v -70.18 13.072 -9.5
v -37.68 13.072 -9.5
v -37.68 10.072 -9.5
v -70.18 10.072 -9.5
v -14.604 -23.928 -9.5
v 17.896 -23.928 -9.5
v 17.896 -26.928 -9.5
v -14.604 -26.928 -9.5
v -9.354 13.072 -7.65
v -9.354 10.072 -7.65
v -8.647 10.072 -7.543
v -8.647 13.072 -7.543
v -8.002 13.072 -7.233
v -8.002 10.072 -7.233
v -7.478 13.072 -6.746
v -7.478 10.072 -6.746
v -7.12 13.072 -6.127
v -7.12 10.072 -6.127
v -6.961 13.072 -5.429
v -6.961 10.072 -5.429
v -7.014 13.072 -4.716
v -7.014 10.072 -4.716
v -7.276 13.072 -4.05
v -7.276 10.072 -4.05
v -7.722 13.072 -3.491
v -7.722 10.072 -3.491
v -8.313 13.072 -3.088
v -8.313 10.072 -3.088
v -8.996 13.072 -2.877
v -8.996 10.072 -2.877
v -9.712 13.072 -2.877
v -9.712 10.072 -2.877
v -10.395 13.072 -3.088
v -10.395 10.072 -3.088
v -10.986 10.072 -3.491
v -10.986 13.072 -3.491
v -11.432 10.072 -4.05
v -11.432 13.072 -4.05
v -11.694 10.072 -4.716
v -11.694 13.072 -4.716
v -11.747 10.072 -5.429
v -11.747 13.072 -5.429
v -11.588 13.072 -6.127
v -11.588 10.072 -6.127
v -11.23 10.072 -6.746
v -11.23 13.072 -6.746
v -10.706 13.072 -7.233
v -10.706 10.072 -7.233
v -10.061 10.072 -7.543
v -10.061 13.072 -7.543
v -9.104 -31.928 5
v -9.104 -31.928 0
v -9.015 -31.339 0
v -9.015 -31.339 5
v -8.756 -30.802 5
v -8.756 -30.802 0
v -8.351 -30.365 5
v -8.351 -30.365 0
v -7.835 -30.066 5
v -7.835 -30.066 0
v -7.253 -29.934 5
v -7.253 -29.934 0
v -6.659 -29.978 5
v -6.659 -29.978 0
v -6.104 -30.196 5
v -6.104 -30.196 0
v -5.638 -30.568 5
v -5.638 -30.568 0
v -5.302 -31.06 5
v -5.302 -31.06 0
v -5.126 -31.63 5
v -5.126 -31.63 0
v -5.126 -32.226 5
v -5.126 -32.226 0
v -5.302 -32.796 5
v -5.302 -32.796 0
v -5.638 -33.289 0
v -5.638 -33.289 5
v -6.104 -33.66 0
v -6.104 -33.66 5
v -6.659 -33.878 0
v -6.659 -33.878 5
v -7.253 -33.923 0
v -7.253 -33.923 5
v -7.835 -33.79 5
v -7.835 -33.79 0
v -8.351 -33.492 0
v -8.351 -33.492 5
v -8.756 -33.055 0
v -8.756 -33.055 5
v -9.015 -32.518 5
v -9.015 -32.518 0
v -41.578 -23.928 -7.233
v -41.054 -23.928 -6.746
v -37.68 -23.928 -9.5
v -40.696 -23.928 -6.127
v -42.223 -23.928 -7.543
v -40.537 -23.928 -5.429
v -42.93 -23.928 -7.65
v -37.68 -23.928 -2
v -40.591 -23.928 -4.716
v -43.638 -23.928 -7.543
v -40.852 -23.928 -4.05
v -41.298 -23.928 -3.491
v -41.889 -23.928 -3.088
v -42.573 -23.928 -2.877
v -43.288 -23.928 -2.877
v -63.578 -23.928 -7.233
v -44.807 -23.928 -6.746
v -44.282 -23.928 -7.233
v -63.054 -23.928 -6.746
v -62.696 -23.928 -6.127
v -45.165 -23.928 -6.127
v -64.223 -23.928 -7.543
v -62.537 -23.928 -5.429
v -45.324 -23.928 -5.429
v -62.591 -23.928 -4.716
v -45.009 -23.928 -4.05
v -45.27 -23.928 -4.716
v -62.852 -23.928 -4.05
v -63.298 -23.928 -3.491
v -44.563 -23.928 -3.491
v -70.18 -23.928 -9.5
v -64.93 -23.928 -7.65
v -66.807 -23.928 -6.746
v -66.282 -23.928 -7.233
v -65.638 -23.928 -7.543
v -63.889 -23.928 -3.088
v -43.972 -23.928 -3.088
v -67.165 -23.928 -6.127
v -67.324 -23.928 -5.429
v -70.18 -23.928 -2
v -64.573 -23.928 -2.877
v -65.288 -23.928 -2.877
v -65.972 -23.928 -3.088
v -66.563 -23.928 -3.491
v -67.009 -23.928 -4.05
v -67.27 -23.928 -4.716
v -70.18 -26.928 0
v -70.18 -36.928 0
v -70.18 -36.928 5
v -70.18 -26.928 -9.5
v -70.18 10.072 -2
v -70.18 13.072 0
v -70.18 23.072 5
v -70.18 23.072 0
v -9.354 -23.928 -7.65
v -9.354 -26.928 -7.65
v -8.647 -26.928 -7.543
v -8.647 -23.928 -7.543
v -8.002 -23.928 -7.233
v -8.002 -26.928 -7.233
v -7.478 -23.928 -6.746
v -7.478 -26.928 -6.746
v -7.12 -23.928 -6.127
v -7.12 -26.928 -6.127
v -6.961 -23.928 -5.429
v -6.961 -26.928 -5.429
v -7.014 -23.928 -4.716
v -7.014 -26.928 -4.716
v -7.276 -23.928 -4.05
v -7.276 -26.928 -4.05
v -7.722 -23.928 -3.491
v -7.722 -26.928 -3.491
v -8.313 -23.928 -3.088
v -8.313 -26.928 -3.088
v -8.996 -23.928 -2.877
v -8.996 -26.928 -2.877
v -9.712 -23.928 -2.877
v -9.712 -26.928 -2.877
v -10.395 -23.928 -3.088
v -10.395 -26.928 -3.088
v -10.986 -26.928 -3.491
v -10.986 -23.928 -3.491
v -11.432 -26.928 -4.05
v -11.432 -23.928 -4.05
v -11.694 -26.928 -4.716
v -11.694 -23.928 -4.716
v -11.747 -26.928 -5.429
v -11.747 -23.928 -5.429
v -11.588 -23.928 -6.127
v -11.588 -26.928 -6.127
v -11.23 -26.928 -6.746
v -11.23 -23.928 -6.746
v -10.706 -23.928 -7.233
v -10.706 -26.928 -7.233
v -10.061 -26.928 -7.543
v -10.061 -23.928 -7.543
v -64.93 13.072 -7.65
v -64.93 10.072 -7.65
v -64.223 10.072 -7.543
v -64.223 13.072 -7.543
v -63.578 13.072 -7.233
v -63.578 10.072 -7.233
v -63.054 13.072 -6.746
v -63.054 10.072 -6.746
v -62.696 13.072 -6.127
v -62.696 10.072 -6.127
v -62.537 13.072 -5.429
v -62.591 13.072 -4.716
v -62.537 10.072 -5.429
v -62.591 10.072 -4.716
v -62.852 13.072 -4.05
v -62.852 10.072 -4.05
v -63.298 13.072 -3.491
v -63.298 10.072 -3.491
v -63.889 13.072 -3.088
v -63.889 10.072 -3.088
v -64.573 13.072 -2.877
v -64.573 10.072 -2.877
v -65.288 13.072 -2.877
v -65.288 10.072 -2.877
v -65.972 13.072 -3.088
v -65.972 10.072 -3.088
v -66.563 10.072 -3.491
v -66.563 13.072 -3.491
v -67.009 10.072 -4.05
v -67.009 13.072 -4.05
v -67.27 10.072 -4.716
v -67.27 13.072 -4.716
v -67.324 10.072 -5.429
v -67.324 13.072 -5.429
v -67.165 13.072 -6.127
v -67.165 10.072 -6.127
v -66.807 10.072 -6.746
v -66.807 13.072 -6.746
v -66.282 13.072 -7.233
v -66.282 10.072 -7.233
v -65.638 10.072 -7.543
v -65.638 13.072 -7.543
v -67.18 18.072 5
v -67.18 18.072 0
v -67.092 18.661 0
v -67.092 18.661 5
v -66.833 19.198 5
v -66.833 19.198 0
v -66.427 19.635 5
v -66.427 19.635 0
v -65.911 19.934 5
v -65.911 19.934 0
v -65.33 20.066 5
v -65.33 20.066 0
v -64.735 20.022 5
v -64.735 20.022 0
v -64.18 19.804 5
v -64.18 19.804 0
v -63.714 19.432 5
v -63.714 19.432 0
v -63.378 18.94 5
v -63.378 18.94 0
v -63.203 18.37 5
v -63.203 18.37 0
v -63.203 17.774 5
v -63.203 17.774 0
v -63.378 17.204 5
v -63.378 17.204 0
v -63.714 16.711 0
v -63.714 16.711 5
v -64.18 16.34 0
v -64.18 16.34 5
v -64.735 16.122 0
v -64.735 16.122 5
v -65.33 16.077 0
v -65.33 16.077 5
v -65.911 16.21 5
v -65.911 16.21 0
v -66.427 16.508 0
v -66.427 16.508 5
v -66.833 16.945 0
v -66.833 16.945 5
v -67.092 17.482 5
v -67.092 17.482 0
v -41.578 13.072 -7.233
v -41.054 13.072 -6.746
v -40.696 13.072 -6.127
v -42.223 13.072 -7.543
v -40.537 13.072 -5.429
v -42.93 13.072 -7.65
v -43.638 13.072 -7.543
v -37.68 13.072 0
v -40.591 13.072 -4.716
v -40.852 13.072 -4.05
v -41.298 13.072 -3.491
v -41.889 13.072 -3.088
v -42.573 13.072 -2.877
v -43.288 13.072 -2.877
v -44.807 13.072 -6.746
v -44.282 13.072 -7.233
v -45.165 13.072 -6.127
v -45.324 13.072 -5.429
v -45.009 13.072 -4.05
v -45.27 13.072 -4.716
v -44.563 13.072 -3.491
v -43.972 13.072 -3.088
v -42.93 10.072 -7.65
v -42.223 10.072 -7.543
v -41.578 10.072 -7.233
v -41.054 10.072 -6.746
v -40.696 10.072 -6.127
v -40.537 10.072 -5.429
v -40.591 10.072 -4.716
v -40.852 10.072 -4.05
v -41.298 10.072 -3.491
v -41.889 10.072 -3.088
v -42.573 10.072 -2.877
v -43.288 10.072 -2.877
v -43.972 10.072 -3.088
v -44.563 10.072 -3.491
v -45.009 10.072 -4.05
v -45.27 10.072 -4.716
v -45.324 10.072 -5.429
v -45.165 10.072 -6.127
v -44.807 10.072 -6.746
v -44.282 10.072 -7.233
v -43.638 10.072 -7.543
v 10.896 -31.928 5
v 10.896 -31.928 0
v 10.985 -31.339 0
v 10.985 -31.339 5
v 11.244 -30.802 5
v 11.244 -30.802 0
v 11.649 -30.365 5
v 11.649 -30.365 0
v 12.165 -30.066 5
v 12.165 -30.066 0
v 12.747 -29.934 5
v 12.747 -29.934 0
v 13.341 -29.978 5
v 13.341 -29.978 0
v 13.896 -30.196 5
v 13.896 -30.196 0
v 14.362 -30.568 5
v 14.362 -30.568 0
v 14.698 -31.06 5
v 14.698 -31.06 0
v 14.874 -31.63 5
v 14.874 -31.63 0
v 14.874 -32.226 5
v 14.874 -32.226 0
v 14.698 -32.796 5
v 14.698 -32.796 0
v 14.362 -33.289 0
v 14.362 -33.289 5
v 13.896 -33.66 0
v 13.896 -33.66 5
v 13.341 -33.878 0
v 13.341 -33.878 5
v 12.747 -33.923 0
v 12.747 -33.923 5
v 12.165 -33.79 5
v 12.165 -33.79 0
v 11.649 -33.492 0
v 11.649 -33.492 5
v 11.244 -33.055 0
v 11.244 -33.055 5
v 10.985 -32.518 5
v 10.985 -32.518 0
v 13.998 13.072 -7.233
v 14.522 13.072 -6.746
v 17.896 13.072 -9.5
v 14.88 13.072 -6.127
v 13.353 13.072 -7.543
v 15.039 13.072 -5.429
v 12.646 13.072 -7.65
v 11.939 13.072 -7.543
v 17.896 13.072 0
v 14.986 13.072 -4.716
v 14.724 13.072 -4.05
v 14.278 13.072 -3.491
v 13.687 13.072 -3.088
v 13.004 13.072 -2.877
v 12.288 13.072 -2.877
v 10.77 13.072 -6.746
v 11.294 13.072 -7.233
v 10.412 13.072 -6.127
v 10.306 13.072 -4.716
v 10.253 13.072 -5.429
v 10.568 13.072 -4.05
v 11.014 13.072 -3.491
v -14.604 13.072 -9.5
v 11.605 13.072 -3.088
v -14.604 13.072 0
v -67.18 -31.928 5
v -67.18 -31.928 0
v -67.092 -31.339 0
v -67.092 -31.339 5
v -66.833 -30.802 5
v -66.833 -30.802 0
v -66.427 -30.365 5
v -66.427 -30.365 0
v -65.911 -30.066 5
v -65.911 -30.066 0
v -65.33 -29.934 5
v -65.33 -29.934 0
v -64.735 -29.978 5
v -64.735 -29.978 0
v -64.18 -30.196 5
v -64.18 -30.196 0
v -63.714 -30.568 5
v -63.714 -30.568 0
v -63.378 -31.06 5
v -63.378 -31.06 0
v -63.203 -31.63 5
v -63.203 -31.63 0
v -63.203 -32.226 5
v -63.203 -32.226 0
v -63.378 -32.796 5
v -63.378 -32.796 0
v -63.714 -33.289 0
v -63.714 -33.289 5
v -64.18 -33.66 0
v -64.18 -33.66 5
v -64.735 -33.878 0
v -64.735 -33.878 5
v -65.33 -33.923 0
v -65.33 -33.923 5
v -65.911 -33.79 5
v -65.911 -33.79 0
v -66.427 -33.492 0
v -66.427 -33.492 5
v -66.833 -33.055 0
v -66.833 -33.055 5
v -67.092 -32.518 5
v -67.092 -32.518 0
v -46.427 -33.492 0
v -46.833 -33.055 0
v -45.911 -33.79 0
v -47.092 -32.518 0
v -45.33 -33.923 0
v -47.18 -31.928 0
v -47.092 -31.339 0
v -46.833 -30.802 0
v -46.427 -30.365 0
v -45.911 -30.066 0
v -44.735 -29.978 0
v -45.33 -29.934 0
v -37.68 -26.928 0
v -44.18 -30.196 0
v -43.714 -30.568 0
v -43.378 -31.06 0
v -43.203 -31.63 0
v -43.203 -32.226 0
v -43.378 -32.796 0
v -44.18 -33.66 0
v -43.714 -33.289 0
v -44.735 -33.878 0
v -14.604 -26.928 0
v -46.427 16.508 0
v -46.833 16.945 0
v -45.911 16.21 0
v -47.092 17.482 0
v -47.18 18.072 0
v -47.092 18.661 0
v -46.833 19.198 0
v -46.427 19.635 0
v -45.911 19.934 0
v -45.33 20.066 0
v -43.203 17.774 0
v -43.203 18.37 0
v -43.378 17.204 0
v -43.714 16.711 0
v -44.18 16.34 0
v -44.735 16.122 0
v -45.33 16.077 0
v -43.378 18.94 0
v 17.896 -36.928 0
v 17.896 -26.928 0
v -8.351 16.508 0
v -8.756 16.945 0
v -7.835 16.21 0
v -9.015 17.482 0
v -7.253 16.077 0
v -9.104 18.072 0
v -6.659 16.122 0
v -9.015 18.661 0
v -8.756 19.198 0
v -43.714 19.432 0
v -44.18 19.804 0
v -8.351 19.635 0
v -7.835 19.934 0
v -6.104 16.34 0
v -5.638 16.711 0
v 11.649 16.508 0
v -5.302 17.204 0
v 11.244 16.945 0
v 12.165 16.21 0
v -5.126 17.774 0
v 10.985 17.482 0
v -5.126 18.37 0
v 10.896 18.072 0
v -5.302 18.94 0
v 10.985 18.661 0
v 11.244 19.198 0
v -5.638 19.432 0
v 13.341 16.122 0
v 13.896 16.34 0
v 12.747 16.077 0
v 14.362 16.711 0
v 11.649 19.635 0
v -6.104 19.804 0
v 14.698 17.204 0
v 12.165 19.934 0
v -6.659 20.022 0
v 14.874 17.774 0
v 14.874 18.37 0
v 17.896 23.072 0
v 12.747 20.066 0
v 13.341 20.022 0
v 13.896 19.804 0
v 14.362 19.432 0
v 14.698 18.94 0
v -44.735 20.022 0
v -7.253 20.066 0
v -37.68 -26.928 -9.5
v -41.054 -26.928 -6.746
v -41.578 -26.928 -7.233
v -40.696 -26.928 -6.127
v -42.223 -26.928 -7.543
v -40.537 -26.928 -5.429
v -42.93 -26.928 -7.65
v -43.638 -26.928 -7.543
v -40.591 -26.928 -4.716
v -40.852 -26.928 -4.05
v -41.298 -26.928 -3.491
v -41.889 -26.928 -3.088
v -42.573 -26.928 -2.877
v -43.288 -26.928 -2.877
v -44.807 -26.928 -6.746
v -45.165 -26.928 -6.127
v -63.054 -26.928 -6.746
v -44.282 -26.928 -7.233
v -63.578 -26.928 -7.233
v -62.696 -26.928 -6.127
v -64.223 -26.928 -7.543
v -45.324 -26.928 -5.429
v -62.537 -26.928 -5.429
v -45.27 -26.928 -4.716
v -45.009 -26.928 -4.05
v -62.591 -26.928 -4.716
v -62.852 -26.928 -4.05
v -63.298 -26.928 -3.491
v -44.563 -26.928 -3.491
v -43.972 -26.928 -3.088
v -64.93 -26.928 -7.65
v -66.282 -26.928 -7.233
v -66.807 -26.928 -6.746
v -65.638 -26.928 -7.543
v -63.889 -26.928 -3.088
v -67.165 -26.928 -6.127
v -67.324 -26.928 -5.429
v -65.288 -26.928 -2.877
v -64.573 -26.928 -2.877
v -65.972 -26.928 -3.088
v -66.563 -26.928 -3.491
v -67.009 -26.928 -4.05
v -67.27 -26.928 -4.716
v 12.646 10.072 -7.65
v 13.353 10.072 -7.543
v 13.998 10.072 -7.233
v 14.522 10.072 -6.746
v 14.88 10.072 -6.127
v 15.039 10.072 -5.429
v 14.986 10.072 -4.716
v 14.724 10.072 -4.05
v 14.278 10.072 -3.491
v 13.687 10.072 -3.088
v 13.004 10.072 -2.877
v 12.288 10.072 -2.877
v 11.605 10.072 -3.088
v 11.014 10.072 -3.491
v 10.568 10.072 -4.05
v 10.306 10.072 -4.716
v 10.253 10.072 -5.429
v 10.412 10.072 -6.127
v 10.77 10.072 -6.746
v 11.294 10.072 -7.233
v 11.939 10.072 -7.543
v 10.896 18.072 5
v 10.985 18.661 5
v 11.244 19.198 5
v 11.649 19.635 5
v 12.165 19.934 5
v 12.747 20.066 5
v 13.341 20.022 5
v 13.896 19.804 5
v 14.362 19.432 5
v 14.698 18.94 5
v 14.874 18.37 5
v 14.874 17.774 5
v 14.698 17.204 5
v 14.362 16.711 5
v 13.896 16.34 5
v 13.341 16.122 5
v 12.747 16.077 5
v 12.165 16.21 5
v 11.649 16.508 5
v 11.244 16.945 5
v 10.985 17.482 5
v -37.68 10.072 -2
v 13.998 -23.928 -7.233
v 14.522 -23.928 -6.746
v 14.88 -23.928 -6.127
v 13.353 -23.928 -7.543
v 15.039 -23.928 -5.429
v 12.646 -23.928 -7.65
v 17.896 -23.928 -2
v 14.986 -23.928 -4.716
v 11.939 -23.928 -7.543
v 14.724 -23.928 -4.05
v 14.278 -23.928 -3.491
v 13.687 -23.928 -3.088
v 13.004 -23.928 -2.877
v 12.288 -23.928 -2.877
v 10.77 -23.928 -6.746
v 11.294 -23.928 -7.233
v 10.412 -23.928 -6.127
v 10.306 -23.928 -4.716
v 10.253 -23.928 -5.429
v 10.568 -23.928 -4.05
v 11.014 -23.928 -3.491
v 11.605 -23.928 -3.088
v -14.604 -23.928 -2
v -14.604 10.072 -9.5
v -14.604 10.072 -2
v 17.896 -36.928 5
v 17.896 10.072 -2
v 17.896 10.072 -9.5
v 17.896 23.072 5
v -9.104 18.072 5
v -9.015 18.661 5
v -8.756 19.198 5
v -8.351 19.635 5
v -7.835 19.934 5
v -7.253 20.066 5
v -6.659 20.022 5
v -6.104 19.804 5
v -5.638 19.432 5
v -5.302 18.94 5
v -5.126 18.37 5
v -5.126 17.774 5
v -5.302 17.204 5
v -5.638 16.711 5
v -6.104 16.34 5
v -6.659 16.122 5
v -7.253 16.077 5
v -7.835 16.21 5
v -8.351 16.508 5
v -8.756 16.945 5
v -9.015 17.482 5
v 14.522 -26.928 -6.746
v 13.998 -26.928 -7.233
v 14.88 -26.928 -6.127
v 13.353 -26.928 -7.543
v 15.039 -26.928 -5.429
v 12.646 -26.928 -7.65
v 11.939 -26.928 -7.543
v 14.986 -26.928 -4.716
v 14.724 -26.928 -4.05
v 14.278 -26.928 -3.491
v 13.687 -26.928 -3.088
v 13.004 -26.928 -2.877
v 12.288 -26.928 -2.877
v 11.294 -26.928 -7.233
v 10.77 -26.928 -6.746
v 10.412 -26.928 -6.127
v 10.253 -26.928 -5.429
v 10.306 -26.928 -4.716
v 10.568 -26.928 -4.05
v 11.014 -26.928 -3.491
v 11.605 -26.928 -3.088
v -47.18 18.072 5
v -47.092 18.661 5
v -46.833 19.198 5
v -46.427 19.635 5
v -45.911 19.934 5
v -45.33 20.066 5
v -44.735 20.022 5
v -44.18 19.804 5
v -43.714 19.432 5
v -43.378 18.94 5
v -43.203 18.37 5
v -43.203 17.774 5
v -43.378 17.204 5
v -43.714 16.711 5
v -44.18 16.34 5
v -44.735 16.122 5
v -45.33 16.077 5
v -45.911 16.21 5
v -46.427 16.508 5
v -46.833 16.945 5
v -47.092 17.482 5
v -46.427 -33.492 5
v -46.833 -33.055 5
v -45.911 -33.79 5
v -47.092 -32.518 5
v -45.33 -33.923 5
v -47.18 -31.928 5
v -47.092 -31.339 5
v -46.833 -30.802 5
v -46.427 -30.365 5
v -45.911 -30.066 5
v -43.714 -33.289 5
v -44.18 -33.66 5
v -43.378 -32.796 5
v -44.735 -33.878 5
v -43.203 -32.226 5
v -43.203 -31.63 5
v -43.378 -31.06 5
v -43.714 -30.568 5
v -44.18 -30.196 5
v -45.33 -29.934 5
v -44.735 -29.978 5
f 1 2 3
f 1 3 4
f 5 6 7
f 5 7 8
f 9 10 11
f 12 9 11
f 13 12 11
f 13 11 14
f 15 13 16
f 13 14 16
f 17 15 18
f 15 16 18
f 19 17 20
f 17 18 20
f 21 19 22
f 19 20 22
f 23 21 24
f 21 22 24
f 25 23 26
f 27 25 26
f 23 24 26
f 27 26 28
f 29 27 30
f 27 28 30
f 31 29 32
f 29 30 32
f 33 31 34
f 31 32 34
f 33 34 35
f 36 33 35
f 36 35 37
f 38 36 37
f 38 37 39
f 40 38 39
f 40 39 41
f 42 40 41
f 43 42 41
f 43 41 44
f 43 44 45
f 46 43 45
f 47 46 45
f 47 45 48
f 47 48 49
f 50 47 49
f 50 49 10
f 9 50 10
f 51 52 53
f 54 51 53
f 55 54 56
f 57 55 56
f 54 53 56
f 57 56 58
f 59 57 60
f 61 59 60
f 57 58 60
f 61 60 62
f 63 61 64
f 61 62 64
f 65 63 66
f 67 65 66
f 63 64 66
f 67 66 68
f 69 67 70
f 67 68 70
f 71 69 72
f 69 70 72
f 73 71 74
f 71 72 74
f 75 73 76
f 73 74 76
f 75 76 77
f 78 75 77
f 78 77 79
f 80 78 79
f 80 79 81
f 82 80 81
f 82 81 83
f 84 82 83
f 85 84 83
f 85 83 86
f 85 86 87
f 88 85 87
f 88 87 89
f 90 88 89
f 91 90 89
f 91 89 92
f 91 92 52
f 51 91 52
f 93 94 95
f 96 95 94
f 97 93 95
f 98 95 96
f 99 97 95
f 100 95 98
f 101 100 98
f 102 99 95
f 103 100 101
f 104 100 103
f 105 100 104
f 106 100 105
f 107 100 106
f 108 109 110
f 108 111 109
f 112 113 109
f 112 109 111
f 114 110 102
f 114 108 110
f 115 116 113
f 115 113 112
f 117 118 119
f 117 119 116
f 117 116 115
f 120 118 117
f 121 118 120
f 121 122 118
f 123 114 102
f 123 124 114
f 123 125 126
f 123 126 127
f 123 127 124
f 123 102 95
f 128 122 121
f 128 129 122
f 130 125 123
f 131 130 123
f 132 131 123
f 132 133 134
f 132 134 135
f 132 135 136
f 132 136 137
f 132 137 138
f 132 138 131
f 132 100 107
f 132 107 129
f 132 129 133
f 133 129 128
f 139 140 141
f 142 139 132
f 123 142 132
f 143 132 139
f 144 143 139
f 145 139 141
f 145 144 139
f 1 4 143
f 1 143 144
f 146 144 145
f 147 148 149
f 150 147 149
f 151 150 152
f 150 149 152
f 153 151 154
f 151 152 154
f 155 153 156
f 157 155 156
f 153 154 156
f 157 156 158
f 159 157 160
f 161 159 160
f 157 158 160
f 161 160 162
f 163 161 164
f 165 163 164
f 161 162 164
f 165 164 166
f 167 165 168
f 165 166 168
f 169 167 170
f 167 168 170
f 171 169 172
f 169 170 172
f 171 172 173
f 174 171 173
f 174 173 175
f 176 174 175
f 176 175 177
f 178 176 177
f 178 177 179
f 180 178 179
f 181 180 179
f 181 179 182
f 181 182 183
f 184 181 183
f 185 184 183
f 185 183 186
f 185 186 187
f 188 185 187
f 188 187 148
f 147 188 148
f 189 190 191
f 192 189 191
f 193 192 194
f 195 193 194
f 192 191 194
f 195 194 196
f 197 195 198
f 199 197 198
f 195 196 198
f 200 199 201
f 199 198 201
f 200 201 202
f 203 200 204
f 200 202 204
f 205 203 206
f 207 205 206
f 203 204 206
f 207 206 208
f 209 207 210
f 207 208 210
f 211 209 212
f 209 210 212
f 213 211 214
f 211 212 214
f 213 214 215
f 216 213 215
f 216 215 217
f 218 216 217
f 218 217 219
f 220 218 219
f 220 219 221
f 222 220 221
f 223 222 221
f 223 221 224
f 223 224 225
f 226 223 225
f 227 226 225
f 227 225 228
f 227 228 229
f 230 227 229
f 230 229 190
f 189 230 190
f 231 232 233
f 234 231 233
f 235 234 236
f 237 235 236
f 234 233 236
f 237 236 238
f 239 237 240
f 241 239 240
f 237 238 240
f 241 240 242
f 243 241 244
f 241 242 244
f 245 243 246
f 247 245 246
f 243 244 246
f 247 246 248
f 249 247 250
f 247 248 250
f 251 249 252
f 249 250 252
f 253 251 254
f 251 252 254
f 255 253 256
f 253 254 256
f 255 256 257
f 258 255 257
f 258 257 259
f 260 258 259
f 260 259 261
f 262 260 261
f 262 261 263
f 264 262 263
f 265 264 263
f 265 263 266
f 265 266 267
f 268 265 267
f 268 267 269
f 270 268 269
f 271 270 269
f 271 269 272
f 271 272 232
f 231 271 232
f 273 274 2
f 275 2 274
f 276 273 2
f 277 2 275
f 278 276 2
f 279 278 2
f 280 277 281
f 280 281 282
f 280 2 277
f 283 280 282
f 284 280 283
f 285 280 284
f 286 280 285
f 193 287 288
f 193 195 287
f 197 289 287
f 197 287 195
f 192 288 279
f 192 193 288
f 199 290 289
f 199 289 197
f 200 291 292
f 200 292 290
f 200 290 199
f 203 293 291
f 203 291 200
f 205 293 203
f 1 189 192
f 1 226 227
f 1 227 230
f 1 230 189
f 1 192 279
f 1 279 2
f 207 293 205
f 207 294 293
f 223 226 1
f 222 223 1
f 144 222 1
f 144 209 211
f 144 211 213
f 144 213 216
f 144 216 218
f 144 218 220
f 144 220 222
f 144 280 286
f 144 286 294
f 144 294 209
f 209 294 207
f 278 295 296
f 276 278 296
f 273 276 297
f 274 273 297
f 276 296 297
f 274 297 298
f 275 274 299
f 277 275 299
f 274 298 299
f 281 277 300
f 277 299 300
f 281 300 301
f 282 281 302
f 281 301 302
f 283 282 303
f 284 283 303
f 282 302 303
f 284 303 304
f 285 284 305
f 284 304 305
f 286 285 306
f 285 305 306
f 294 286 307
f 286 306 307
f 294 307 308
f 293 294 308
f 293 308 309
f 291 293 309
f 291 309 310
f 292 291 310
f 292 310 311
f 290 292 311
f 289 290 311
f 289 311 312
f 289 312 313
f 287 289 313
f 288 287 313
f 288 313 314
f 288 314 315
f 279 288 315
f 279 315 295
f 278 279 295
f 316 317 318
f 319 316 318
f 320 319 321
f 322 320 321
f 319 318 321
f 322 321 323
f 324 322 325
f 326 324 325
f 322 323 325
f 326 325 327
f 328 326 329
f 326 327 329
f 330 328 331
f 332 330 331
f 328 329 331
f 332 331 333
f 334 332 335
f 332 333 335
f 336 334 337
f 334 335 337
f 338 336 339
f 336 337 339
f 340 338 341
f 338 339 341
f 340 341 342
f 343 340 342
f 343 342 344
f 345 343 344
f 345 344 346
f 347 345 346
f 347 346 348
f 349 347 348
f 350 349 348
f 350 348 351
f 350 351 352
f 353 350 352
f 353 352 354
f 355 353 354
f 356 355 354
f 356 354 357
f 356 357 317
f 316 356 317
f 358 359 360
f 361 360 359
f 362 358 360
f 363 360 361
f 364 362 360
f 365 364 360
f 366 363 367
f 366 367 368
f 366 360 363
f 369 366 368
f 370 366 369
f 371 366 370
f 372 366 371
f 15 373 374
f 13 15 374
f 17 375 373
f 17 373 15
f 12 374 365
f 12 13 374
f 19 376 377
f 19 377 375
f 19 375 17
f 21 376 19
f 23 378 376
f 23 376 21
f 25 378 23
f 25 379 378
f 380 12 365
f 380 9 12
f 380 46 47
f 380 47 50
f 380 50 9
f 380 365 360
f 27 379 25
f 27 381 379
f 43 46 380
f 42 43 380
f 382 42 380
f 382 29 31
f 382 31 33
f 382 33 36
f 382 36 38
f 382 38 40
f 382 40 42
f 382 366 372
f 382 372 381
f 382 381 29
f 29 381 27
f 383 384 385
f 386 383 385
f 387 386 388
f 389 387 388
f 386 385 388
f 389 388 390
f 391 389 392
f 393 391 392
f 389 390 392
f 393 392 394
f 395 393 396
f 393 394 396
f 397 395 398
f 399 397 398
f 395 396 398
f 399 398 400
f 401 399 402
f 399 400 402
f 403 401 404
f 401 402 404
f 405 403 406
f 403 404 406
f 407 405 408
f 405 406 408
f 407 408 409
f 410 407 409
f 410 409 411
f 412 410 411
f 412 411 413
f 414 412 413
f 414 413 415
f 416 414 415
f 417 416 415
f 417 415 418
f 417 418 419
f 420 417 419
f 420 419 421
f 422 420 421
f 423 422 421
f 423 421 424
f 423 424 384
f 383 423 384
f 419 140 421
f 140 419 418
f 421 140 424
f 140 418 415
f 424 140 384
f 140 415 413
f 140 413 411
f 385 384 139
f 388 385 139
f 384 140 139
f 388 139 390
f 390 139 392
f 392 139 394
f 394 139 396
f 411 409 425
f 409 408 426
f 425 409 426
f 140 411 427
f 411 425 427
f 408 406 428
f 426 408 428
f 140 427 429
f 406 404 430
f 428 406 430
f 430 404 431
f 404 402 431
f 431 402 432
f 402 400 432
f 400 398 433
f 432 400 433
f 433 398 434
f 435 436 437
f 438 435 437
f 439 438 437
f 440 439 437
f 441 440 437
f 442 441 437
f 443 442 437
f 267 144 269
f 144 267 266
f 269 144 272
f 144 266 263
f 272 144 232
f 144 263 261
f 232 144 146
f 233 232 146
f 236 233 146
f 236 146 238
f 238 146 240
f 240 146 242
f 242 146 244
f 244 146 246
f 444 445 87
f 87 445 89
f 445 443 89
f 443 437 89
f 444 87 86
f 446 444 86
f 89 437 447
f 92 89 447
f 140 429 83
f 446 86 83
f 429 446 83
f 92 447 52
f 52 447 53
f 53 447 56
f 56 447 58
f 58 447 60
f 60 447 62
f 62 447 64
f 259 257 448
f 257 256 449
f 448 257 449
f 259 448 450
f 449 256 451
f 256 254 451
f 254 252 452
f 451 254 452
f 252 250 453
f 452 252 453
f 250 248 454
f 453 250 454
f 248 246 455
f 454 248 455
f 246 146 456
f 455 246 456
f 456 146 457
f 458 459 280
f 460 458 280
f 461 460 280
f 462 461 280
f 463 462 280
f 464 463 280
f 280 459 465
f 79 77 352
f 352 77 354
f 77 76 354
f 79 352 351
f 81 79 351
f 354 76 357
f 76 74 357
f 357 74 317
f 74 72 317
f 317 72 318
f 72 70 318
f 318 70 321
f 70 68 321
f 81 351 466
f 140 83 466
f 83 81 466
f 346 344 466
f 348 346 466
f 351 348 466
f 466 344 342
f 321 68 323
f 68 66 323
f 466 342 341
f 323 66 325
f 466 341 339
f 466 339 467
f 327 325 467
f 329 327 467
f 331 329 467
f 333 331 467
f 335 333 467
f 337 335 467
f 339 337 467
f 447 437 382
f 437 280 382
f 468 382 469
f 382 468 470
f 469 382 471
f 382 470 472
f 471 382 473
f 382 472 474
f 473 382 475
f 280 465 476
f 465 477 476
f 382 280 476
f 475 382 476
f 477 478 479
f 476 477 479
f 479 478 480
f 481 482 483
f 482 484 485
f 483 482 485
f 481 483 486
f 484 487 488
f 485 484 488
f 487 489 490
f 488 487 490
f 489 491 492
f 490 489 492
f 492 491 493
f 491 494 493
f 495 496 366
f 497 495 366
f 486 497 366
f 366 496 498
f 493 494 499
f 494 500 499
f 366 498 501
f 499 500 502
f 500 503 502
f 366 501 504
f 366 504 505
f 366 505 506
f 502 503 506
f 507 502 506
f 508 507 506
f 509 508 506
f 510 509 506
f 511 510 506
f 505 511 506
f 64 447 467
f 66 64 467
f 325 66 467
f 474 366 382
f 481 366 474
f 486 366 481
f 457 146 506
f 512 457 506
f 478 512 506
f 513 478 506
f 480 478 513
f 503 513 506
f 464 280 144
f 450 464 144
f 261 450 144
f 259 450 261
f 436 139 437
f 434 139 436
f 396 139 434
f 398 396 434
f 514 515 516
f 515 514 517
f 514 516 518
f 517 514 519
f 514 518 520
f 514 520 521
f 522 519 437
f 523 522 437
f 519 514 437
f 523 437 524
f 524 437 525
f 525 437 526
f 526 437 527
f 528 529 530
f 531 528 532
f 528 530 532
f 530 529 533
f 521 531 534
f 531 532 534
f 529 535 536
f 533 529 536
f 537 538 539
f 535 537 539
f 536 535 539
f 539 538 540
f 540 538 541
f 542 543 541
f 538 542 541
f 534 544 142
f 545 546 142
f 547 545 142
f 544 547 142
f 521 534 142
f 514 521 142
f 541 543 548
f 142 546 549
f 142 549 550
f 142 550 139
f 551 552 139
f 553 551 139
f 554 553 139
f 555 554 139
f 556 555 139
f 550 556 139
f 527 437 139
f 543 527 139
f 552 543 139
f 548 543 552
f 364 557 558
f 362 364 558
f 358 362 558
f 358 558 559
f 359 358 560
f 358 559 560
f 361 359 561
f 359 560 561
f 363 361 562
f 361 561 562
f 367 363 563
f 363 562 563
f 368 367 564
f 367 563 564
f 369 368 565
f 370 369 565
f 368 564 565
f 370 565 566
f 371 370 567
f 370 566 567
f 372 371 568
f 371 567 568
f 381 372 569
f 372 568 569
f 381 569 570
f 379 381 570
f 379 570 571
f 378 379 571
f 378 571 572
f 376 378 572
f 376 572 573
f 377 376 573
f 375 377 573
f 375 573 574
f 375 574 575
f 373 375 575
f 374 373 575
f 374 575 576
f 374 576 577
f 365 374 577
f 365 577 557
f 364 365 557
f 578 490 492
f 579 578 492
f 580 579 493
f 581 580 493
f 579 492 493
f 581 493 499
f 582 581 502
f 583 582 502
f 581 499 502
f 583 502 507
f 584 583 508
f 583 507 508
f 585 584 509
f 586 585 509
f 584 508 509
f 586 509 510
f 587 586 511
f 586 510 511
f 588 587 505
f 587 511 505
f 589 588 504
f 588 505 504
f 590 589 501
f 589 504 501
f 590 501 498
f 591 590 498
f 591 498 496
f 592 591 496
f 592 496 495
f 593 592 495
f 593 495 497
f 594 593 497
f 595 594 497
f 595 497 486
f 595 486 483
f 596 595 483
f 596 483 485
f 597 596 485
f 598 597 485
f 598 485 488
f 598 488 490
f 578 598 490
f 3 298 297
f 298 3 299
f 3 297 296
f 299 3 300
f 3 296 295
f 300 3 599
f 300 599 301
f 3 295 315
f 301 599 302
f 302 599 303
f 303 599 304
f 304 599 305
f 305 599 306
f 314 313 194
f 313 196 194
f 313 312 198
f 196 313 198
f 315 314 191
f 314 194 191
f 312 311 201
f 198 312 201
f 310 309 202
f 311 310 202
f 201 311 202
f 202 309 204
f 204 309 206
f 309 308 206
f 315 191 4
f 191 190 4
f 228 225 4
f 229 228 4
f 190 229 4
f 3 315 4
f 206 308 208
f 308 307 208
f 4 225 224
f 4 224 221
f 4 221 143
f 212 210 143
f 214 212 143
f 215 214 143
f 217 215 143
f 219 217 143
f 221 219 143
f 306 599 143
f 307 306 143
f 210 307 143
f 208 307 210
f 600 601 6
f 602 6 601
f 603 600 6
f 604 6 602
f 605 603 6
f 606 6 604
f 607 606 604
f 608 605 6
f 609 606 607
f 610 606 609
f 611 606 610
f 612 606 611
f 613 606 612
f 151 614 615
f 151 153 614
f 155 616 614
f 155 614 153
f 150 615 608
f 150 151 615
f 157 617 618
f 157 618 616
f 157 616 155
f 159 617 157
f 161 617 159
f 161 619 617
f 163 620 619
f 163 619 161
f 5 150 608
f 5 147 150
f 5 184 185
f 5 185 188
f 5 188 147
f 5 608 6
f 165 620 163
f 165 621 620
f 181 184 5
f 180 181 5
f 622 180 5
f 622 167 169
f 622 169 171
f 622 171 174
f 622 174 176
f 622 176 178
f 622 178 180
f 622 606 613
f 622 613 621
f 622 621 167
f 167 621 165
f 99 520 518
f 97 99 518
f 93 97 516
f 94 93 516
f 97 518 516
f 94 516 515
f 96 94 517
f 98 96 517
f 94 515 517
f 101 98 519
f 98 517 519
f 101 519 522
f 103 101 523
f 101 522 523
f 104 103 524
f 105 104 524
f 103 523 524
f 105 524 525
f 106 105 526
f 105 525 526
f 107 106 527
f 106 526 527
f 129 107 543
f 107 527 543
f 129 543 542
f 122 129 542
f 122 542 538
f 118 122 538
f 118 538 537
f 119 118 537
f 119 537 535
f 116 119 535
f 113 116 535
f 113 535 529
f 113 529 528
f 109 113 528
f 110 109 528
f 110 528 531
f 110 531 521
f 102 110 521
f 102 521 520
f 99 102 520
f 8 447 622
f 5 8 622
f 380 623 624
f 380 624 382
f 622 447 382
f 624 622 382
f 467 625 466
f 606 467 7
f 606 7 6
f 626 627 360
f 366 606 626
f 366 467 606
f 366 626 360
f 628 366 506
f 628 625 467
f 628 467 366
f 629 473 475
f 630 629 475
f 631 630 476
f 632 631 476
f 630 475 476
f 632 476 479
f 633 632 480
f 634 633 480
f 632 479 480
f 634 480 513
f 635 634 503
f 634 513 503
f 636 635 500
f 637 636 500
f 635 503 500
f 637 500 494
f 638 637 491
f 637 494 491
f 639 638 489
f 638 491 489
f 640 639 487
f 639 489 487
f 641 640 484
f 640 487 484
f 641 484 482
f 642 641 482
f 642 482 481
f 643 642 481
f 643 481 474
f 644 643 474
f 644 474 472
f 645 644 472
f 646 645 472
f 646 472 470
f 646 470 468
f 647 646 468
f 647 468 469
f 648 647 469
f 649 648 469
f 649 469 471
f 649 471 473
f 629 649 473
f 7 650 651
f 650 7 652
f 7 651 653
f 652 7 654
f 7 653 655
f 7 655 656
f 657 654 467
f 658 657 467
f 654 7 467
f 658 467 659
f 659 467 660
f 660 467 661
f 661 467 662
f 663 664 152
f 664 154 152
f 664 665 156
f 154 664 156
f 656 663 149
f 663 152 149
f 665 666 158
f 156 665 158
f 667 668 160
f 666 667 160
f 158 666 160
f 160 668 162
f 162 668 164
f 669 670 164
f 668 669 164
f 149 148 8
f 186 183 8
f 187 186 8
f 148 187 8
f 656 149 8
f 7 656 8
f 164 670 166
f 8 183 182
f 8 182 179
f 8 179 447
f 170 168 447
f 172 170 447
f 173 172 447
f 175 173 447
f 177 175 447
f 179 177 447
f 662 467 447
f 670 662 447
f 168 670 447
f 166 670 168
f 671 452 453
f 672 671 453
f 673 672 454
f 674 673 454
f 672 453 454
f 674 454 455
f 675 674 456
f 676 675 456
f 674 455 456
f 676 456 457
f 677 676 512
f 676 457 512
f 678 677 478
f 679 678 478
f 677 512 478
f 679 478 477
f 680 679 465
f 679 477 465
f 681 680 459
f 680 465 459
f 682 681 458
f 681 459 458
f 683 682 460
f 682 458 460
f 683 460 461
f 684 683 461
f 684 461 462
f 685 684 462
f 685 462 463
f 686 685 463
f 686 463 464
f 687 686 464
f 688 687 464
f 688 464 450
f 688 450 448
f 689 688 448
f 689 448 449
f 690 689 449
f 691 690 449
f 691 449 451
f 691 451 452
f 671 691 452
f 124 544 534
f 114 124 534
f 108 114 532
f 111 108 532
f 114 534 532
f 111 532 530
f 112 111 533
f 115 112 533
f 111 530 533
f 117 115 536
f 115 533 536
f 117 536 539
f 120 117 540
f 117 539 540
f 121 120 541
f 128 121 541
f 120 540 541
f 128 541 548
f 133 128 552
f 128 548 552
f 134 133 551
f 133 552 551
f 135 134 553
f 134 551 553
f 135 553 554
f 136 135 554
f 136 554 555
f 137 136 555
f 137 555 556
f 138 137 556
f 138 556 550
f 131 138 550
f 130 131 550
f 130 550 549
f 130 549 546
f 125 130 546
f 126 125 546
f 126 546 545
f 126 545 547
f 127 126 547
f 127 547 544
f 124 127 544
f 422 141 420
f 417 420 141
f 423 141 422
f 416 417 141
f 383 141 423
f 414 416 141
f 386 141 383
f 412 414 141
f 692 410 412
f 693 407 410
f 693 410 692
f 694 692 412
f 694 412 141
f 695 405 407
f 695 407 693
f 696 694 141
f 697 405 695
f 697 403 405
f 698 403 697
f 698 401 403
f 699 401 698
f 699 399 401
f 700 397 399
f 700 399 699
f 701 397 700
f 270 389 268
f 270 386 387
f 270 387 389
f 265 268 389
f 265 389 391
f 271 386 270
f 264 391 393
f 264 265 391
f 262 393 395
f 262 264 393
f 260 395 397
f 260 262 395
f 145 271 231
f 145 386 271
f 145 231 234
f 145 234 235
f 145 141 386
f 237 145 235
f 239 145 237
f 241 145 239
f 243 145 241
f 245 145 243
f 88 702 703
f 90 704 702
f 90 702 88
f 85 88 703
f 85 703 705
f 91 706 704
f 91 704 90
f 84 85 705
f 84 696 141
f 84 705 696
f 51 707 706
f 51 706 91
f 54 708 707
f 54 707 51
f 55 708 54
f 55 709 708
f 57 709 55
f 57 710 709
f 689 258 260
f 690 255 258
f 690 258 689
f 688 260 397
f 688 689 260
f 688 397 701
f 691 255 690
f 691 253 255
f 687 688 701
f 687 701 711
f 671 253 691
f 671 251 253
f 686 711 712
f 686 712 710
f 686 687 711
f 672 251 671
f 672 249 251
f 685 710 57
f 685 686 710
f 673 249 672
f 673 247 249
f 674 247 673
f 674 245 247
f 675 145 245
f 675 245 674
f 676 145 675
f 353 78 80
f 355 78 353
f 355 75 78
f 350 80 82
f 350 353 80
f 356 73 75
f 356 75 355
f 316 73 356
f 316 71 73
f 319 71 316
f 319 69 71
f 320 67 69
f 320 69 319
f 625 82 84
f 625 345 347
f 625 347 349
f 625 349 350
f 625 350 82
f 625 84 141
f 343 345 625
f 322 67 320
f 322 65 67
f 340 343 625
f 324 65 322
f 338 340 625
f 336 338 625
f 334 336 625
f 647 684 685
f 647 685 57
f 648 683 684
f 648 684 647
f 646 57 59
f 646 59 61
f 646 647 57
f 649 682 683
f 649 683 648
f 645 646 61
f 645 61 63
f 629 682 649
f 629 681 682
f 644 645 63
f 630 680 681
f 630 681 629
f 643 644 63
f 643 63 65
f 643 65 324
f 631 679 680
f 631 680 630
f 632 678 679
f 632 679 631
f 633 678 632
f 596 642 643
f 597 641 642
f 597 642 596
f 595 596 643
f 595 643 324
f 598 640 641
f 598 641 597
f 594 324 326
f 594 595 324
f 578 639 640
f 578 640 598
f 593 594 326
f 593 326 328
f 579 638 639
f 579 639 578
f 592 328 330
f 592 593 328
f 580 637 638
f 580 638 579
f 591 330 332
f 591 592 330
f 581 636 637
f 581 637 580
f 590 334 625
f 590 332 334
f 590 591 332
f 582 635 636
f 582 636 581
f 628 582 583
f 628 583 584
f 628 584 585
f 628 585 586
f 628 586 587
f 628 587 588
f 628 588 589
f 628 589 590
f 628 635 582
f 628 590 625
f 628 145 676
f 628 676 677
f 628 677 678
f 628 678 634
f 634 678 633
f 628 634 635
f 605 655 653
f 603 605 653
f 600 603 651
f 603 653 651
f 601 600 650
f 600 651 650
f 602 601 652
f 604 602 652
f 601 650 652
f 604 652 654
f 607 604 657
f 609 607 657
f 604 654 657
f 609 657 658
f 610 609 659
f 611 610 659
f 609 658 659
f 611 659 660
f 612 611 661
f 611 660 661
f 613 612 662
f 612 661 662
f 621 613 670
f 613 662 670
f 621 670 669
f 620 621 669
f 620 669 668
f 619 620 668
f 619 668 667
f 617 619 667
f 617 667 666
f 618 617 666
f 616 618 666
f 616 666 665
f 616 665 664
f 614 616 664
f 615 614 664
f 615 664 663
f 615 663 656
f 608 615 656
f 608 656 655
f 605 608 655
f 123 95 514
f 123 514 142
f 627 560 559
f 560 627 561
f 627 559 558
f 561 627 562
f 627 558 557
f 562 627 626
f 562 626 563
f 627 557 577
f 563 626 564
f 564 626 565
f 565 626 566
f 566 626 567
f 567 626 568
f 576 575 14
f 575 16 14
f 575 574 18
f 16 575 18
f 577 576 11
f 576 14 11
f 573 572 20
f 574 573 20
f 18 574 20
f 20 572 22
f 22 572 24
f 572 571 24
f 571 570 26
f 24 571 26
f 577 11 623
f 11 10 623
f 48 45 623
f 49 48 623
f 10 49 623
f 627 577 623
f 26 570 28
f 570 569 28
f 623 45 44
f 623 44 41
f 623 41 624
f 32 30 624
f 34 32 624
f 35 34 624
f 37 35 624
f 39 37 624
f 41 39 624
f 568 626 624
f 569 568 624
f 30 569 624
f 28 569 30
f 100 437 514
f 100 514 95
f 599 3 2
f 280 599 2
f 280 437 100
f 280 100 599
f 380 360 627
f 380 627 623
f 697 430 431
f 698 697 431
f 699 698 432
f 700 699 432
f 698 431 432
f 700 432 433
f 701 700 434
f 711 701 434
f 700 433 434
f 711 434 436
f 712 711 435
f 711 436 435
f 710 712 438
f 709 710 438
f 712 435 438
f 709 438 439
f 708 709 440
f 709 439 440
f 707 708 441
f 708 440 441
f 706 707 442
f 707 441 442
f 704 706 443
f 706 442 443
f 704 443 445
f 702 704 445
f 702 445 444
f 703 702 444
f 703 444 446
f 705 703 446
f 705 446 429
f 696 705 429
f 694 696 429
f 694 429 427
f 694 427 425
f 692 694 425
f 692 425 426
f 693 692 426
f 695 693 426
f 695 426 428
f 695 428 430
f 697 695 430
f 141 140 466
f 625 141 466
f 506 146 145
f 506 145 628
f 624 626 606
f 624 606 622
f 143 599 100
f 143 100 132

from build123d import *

# Parameters (mm, degrees)
SKETCH_1_W          = 88.07644651
SKETCH_1_H          = 60
EXTRUDE_1_DEPTH     = 5
SKETCH_3_W          = 32.5
SKETCH_3_H          = 3
EXTRUDE_2_DEPTH     = 9.5
SKETCH_4_R          = 2.4
CUT_EXTRUDE_2_DEPTH = 100
SKETCH_5_W          = 32.5
SKETCH_5_H          = 34
EXTRUDE_3_DEPTH     = 2
SKETCH_6_R          = 2
CUT_EXTRUDE_3_DEPTH = 10


with BuildPart() as part:
    # 草图1 → 凸台-拉伸1 (new body)
    with BuildSketch(Plane.XY):
        with Locations((-26.142212211, -6.928181841)):
            Rectangle(SKETCH_1_W, SKETCH_1_H)
    extrude(amount=EXTRUDE_1_DEPTH)

    # 草图3 → 凸台-拉伸2 (add)
    with BuildSketch(Plane(origin=(0, 0, 0), x_dir=(-1, 0, 0), z_dir=(0, 0, -1))):
        with Locations((-1.646011044, 11.571818159)):
            Rectangle(SKETCH_3_W, SKETCH_3_H)
        with Locations((53.930435466, 11.571818159)):
            Rectangle(SKETCH_3_W, SKETCH_3_H)
        with Locations((-1.646011044, -25.428181841)):
            Rectangle(SKETCH_3_W, SKETCH_3_H)
        with Locations((53.930435466, -25.428181841)):
            Rectangle(SKETCH_3_W, SKETCH_3_H)
    extrude(amount=EXTRUDE_2_DEPTH)

    # 草图4 → 切除-拉伸2 (cut)
    with BuildSketch(Plane(origin=(0, -26.928181841, 0), x_dir=(-1, 0, 0), z_dir=(0, -1, 0))):
        with Locations(Location((-12.646011044, 5.25, 0), (0, 0, 90))):
            Circle(SKETCH_4_R)
        with Locations(Location((9.353988956, 5.25, 0), (0, 0, 90))):
            Circle(SKETCH_4_R)
        with Locations(Location((42.930435466, 5.25, 0), (0, 0, 90))):
            Circle(SKETCH_4_R)
        with Locations(Location((64.930435466, 5.25, 0), (0, 0, 90))):
            Circle(SKETCH_4_R)
    extrude(amount=-CUT_EXTRUDE_2_DEPTH, mode=Mode.SUBTRACT)

    # 草图5 → 凸台-拉伸3 (add)
    with BuildSketch(Plane(origin=(0, 0, 0), x_dir=(-1, 0, 0), z_dir=(0, 0, -1))):
        with Locations((-1.646011044, -6.928181841)):
            Rectangle(SKETCH_5_W, SKETCH_5_H)
        with Locations((53.930435466, -6.928181841)):
            Rectangle(SKETCH_5_W, SKETCH_5_H)
    extrude(amount=EXTRUDE_3_DEPTH)

    # 草图6 → 切除-拉伸3 (cut)
    with BuildSketch(Plane(origin=(0, 0, 0), x_dir=(-1, 0, 0), z_dir=(0, 0, -1))):
        with Locations((-12.896011044, 18.071818159)):
            Circle(SKETCH_6_R)
        with Locations((-12.896011044, -31.928181841)):
            Circle(SKETCH_6_R)
        with Locations((7.103988956, 18.071818159)):
            Circle(SKETCH_6_R)
        with Locations((7.103988956, -31.928181841)):
            Circle(SKETCH_6_R)
        with Locations((65.180435466, 18.071818159)):
            Circle(SKETCH_6_R)
        with Locations((65.180435466, -31.928181841)):
            Circle(SKETCH_6_R)
        with Locations((45.180435466, 18.071818159)):
            Circle(SKETCH_6_R)
        with Locations((45.180435466, -31.928181841)):
            Circle(SKETCH_6_R)
    extrude(amount=-CUT_EXTRUDE_3_DEPTH, mode=Mode.SUBTRACT)


solid = part.part
